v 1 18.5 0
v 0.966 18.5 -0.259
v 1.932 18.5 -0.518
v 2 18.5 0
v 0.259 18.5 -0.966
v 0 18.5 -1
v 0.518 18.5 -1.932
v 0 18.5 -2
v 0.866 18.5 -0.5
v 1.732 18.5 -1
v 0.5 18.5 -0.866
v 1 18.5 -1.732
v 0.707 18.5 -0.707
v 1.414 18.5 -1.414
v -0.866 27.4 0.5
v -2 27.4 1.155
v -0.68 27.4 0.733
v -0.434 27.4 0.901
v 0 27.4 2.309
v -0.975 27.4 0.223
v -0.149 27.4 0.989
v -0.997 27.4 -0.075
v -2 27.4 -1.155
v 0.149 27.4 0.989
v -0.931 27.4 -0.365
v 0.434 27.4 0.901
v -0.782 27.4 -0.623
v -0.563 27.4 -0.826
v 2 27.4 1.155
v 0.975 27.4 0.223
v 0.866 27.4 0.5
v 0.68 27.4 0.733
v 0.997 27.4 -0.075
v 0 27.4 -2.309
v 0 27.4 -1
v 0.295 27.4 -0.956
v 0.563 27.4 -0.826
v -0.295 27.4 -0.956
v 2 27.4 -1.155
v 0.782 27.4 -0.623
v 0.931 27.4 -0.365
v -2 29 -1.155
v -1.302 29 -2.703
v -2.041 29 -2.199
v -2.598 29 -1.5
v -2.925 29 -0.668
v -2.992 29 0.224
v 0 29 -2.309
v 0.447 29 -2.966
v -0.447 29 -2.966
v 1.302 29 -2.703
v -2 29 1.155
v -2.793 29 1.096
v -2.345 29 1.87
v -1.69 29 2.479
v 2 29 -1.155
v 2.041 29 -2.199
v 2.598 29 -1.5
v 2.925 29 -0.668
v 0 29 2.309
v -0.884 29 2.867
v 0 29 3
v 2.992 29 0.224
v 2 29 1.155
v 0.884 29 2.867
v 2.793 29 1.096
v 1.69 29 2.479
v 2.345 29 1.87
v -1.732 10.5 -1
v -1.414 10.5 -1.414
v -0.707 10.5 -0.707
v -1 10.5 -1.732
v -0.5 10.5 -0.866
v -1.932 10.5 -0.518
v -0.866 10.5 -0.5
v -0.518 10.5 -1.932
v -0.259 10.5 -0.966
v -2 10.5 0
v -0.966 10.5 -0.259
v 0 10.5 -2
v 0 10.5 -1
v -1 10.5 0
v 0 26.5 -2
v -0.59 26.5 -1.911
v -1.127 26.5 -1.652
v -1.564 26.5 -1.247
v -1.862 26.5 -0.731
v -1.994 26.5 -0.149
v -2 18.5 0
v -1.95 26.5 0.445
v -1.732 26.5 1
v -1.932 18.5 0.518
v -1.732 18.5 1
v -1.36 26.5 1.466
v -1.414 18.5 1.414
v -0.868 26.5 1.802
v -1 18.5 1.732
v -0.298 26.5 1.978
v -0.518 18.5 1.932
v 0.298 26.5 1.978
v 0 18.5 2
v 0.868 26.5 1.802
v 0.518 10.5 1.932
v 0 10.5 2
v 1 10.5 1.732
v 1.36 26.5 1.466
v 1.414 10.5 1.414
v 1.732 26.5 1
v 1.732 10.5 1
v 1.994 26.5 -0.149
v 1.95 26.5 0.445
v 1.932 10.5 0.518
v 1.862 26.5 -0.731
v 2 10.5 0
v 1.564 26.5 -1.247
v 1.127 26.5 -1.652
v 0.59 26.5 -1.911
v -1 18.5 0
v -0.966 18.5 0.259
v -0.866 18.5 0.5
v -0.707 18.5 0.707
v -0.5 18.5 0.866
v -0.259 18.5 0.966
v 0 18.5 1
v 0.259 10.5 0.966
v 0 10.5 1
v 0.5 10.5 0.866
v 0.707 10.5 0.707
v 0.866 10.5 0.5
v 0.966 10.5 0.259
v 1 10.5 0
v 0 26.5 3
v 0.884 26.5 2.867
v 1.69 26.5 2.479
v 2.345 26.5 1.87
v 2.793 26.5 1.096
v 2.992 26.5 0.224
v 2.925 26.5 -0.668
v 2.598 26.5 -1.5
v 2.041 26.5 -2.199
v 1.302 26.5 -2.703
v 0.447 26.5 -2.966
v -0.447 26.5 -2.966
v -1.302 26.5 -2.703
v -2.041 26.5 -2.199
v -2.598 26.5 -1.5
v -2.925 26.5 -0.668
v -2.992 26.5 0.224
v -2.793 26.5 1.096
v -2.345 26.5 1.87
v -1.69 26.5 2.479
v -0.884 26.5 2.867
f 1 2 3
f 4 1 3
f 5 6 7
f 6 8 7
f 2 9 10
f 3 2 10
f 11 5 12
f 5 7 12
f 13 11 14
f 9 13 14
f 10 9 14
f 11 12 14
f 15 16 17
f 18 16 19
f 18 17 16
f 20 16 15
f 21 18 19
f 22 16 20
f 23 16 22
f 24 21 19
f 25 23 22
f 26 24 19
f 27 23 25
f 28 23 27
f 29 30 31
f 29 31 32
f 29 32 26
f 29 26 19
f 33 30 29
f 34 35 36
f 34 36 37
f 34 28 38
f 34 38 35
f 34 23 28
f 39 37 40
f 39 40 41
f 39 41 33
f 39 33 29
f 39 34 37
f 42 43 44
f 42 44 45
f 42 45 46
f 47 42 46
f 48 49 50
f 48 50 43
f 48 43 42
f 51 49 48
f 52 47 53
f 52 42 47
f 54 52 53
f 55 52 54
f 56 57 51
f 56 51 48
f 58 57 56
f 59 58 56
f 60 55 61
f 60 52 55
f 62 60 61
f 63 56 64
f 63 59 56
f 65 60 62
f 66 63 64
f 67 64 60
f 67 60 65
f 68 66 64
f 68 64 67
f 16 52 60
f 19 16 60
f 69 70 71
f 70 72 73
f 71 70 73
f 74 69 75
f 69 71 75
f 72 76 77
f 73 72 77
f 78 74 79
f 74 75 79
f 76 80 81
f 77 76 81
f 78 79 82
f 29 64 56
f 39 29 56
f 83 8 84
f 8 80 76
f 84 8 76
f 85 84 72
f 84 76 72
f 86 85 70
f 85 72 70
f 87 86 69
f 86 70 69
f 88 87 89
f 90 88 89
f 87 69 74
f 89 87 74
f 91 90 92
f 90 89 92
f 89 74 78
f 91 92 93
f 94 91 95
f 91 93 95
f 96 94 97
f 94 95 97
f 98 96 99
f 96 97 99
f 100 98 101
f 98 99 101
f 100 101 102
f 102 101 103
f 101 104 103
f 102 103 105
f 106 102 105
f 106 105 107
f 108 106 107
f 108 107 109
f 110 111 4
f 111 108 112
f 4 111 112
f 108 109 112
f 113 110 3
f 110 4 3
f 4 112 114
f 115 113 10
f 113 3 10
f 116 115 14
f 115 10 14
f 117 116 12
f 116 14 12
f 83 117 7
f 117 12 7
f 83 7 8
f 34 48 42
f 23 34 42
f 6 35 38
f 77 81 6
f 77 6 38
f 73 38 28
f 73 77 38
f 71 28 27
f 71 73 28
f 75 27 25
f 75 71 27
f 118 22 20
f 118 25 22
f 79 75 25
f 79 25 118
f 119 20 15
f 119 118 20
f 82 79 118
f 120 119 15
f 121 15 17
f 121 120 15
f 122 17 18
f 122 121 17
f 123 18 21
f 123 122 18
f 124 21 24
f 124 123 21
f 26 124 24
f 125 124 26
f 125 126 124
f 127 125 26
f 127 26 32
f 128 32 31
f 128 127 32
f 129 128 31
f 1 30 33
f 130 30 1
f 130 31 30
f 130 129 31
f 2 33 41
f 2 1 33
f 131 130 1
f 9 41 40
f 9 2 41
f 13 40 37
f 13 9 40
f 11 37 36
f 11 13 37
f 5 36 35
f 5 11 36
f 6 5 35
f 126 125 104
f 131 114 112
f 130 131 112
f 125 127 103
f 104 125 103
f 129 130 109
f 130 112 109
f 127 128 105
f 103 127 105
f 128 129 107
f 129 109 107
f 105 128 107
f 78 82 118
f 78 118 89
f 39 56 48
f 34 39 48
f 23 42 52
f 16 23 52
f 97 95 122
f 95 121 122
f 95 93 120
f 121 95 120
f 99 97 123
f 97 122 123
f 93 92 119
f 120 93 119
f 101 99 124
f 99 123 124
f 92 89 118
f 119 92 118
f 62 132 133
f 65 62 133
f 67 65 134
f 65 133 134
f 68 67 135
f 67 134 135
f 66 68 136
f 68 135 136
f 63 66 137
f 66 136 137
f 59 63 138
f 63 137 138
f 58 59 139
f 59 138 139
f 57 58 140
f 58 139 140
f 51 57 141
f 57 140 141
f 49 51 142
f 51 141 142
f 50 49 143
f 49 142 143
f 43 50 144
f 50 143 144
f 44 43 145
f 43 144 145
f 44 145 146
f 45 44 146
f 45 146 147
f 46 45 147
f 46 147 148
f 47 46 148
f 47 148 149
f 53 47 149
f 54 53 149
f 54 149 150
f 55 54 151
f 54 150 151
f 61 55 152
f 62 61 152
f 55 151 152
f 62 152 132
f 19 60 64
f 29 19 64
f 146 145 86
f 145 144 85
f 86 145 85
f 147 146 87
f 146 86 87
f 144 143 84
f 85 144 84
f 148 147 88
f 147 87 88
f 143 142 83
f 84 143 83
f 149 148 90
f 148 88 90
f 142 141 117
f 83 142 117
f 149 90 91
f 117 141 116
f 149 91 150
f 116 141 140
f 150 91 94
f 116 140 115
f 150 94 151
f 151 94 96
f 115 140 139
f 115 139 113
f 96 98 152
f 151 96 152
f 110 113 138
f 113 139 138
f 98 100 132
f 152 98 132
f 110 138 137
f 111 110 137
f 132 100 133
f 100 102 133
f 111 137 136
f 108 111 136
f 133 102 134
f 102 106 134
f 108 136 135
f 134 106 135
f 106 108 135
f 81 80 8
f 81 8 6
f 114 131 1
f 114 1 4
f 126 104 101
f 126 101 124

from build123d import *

# Parameters (mm, degrees)
SKETCH_1_R          = 2
SKETCH_1_R_2        = 1
EXTRUDE_1_DEPTH     = 29
SKETCH_2_R          = 3
SKETCH_2_R_2        = 2
EXTRUDE_2_DEPTH     = 2.5
EXTRUDE_START       = 26.5
SKETCH_3_R          = 3
SKETCH_3_R_2        = 2
EXTRUDE_3_DEPTH     = 2.5
SKETCH_4_R          = 1.6
CUT_EXTRUDE_1_DEPTH = 1.5
CUT_EXTRUDE_START   = 29
CUT_EXTRUDE_2_DEPTH = 1.6
SKETCH_7_R          = 3
CUT_EXTRUDE_3_DEPTH = 10.5
CUT_EXTRUDE_START_2 = 10.5
CUT_EXTRUDE_4_DEPTH = 8


with BuildPart() as part:
    # 草图1 → 凸台-拉伸1 (new body)
    with BuildSketch(Plane(origin=(0, 0, 0), x_dir=(1, 0, 0), z_dir=(0, 1, 0))):
        with Locations(Location((0, 0, 0), (0, 0, 90))):
            Circle(SKETCH_1_R)
        with Locations(Location((0, 0, 0), (0, 0, 90))):
            Circle(SKETCH_1_R_2, mode=Mode.SUBTRACT)
    extrude(amount=EXTRUDE_1_DEPTH)

    # 草图2 → 凸台-拉伸2 (add)
    with BuildSketch(Plane(origin=(0, 0, 0), x_dir=(1, 0, 0), z_dir=(0, 1, 0))):
        with Locations(Location((0, 0, 0), (0, 0, 270))):
            Circle(SKETCH_2_R)
        with Locations(Location((0, 0, 0), (0, 0, 90))):
            Circle(SKETCH_2_R_2, mode=Mode.SUBTRACT)
    extrude(amount=EXTRUDE_2_DEPTH)

    # 草图3 → 凸台-拉伸3 (add)
    with BuildSketch(Plane(origin=(0, 0, 0), x_dir=(1, 0, 0), z_dir=(0, 1, 0)).offset(EXTRUDE_START)):
        with Locations(Location((0, 0, 0), (0, 0, 270))):
            Circle(SKETCH_3_R)
        with Locations(Location((0, 0, 0), (0, 0, 90))):
            Circle(SKETCH_3_R_2, mode=Mode.SUBTRACT)
    extrude(amount=EXTRUDE_3_DEPTH)

    # 草图4 → 切除-拉伸1 (cut)
    with BuildSketch(Plane(origin=(0, 0, 0), x_dir=(1, 0, 0), z_dir=(0, 1, 0))):
        with Locations(Location((0, 0, 0), (0, 0, 270))):
            Circle(SKETCH_4_R)
    extrude(amount=CUT_EXTRUDE_1_DEPTH, mode=Mode.SUBTRACT)

    # 草图5 → 切除-拉伸2 (cut)
    with BuildSketch(Plane(origin=(0, 0, 0), x_dir=(1, 0, 0), z_dir=(0, 1, 0)).offset(CUT_EXTRUDE_START)):
        Polygon((0, -2.309401077), (2, -1.154700538), (2, 1.154700538), (0, 2.309401077), (-2, 1.154700538), (-2, -1.154700538), align=None)
    extrude(amount=-CUT_EXTRUDE_2_DEPTH, mode=Mode.SUBTRACT)

    # 草图7 → 切除-拉伸3 (cut)
    with BuildSketch(Plane(origin=(0, 0, 0), x_dir=(1, 0, 0), z_dir=(0, 1, 0))):
        with Locations(Location((0, 0, 0), (0, 0, 270))):
            Circle(SKETCH_7_R)
    extrude(amount=CUT_EXTRUDE_3_DEPTH, mode=Mode.SUBTRACT)

    # 草图8 → 切除-拉伸4 (cut)
    with BuildSketch(Plane(origin=(0, 0, 0), x_dir=(1, 0, 0), z_dir=(0, 1, 0)).offset(CUT_EXTRUDE_START_2)):
        with BuildLine():
            Line((0, 0), (2, 0))
            ThreePointArc((2, 0), (1.414213562, 1.414213562), (0, 2))
            Line((0, 2), (0, 0))
        make_face()
        with BuildLine():
            Line((0, -2), (0, 0))
            Line((0, 0), (-2, 0))
            ThreePointArc((-2, 0), (-1.414213562, -1.414213562), (0, -2))
        make_face()
    extrude(amount=CUT_EXTRUDE_4_DEPTH, mode=Mode.SUBTRACT)


solid = part.part
